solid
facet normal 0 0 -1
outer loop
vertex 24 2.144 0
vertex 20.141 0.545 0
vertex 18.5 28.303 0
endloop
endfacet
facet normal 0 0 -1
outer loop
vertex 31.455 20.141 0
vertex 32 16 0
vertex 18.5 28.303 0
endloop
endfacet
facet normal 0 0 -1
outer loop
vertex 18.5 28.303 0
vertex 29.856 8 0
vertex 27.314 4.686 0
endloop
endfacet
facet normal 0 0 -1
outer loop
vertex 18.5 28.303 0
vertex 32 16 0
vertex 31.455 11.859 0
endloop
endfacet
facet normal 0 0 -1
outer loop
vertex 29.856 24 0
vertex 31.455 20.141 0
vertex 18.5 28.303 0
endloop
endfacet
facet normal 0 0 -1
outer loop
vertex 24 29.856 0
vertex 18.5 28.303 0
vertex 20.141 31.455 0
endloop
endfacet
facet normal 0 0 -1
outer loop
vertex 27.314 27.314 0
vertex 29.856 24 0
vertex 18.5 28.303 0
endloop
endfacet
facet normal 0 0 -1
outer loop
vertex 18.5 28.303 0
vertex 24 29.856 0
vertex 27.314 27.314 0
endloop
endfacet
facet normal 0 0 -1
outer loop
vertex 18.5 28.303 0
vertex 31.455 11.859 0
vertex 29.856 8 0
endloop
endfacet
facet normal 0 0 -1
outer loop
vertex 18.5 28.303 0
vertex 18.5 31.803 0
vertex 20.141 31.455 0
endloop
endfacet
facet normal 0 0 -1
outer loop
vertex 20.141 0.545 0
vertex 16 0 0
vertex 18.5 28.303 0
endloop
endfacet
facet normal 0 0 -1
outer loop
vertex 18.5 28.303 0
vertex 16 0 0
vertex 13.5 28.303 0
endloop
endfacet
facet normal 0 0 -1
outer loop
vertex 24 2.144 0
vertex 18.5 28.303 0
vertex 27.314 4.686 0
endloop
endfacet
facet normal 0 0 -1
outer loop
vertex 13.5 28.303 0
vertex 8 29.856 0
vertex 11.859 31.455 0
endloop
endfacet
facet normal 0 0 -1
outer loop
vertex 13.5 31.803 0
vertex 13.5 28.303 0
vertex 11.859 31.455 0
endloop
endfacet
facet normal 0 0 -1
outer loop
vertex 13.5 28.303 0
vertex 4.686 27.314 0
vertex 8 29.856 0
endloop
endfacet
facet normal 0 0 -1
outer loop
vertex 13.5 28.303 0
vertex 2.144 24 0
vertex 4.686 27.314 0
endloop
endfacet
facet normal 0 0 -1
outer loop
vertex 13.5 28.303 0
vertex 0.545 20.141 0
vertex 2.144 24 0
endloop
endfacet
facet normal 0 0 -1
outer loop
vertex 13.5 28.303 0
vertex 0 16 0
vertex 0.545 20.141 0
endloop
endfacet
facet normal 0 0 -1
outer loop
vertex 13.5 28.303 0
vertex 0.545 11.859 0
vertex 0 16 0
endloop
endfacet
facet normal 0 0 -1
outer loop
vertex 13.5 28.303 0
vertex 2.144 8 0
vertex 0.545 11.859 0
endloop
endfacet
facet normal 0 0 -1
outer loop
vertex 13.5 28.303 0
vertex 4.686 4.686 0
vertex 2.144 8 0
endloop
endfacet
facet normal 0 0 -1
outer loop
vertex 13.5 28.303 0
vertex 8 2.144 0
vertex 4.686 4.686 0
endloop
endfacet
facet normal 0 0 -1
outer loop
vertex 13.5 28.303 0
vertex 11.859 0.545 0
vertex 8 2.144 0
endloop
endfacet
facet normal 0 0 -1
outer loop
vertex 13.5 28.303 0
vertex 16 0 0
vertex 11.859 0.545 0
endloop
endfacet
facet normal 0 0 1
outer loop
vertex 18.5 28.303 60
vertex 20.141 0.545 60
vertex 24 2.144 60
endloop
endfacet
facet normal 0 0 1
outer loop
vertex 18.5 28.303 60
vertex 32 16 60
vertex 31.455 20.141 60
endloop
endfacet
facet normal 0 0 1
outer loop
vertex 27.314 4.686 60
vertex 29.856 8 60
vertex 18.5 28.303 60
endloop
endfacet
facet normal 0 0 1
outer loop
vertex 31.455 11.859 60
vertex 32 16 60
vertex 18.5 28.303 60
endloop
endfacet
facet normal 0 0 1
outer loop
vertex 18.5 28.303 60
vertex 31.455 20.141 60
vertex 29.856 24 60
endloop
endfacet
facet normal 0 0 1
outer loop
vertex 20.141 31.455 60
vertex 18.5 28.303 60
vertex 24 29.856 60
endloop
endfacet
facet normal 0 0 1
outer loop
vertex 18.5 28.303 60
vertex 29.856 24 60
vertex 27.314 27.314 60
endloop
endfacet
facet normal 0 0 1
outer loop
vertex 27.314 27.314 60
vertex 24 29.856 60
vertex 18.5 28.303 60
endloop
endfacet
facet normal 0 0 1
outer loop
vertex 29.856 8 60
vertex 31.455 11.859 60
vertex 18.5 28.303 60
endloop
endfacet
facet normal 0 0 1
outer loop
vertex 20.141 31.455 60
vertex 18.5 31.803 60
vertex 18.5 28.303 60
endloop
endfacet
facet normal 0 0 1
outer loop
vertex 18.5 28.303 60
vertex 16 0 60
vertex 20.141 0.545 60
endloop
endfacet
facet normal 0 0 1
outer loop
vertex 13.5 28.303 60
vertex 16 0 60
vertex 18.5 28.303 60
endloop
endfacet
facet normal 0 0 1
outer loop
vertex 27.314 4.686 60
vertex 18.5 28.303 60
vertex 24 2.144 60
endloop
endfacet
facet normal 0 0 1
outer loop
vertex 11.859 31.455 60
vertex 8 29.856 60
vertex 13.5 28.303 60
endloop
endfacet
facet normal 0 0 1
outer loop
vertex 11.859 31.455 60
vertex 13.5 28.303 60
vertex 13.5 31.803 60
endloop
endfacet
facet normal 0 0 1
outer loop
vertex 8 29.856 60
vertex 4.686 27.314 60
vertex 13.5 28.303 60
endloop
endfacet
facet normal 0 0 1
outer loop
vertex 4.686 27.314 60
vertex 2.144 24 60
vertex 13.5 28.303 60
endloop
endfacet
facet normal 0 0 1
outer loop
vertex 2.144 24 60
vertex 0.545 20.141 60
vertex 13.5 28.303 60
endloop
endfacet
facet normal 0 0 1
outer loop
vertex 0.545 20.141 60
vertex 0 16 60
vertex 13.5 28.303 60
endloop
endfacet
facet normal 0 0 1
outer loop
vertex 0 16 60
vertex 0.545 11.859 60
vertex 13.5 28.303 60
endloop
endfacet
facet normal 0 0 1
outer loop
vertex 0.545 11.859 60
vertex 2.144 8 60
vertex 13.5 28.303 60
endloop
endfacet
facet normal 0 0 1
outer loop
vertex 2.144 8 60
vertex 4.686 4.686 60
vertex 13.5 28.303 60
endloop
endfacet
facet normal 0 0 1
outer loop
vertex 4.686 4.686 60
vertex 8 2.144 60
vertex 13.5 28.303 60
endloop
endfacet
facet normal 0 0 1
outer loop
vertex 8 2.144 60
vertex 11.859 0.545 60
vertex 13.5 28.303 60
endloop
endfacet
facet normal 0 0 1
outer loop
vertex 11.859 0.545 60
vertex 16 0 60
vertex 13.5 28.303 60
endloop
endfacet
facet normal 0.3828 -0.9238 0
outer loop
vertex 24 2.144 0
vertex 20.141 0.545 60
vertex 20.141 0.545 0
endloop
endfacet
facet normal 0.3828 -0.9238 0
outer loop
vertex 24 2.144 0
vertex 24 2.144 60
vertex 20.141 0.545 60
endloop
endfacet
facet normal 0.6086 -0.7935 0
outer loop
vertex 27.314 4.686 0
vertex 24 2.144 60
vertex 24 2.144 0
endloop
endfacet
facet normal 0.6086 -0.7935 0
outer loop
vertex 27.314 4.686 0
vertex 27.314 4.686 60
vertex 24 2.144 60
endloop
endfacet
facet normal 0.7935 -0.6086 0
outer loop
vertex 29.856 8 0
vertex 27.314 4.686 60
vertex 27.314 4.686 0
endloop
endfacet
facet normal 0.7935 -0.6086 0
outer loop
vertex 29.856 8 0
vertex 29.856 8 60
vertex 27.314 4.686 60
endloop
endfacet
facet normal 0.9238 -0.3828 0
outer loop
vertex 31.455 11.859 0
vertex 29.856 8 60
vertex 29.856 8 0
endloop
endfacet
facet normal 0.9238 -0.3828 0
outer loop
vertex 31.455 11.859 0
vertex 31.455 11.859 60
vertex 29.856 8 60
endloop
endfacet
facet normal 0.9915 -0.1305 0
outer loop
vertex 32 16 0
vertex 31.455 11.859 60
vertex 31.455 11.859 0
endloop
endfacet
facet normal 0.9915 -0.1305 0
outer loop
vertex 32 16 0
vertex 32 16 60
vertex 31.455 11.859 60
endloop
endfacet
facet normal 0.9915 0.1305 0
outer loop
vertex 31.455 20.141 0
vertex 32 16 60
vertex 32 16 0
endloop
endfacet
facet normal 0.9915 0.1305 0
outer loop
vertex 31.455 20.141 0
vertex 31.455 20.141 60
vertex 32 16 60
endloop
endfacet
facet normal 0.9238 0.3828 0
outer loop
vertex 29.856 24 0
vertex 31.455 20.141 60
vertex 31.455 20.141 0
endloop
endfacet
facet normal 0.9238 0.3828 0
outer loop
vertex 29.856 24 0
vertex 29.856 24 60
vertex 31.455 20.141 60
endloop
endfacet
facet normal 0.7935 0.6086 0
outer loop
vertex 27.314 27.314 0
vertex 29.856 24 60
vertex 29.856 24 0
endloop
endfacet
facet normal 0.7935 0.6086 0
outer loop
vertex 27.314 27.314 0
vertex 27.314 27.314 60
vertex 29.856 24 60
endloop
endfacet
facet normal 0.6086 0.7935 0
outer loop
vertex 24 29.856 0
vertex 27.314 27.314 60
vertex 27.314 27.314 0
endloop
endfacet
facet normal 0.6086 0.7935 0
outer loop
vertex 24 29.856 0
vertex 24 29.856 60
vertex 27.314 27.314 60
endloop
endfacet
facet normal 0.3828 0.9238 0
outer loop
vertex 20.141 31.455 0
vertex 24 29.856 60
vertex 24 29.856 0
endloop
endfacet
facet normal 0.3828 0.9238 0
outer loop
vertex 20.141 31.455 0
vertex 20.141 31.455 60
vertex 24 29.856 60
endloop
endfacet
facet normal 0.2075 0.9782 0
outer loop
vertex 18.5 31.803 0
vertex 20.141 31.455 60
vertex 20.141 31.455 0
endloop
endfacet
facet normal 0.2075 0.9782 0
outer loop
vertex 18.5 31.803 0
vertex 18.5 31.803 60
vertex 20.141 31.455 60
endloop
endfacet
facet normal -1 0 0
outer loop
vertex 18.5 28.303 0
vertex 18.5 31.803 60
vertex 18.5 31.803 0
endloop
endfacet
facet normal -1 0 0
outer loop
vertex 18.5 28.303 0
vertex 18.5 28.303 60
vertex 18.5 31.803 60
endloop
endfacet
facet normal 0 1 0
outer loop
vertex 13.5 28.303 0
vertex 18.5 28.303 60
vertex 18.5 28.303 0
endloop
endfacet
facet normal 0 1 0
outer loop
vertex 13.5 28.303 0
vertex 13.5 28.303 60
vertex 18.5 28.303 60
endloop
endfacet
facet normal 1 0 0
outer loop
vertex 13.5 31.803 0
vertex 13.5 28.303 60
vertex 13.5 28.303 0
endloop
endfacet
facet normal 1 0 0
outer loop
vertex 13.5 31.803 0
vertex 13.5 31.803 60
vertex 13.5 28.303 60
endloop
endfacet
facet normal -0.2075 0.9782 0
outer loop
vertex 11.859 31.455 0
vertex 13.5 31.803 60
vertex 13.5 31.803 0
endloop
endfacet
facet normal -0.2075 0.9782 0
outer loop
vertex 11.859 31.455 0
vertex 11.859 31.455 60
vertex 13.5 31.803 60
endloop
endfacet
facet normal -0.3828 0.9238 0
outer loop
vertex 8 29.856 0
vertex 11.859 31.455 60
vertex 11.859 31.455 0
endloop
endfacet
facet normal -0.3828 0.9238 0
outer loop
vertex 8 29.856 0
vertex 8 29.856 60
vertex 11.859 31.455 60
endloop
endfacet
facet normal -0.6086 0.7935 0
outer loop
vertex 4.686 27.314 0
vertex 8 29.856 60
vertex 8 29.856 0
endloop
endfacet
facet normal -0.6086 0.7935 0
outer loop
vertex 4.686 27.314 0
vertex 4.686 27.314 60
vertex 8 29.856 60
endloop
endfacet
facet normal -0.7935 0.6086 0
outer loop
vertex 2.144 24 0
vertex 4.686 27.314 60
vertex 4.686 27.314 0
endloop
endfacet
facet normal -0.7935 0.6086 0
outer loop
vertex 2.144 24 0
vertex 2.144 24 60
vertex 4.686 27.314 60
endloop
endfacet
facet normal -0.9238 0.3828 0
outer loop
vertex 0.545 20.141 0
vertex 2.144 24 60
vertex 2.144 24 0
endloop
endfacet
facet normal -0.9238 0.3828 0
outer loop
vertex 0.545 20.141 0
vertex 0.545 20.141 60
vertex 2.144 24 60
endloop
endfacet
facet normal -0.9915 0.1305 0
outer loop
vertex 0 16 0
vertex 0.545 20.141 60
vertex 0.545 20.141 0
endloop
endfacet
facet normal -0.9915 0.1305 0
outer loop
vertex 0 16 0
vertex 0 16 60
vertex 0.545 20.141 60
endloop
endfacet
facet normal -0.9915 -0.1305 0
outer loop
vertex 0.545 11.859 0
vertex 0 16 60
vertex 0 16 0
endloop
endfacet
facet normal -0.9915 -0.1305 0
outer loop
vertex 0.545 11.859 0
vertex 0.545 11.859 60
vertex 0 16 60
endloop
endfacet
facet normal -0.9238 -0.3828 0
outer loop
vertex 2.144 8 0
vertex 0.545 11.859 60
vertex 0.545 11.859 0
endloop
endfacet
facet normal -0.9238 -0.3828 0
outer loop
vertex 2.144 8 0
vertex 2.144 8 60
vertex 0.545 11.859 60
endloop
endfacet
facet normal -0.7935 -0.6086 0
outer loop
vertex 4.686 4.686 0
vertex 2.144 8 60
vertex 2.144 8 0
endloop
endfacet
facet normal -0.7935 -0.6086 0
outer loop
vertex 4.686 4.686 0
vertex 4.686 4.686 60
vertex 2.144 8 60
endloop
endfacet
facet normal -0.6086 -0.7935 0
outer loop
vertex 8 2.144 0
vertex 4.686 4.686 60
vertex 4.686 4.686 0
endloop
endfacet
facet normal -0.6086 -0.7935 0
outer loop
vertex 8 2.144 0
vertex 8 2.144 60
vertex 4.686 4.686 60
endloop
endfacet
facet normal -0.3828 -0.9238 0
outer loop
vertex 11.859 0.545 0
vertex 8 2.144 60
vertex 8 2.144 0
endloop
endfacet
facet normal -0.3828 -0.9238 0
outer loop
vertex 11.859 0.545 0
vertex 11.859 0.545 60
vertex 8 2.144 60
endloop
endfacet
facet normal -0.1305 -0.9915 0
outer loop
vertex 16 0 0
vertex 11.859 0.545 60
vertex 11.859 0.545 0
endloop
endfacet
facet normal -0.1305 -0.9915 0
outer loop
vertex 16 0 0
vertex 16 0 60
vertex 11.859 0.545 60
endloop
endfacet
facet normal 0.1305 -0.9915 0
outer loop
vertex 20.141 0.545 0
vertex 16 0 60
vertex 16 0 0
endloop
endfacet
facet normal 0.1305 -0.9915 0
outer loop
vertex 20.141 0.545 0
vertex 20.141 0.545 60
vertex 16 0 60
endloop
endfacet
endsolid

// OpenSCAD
$fn = 32;

// ----------------------------------------------------------------------
// Keyway shaft: d32 shaft, key 5 x 3.5 mm
// ----------------------------------------------------------------------

// --- parameters (mm) ---
shaft_r = 16;             // shaft radius
key_w = 5;                // keyway width
key_d = 3.5;              // keyway depth below the surface line
plate_t = 60;             // shaft length, Z (extrusion height)

shaft_d = 2 * shaft_r;  // shaft diameter
circle_step = 15;  // polygon sampling step, degrees

profile = [[11.859, 31.455], [8, 29.856], [4.686, 27.314], [2.144, 24], [0.545, 20.141], [0, 16], [0.545, 11.859], [2.144, 8], [4.686, 4.686], [8, 2.144], [11.859, 0.545], [16, 0], [20.141, 0.545], [24, 2.144], [27.314, 4.686], [29.856, 8], [31.455, 11.859], [32, 16], [31.455, 20.141], [29.856, 24], [27.314, 27.314], [24, 29.856], [20.141, 31.455], [18.5, 31.803], [18.5, 28.303], [13.5, 28.303], [13.5, 31.803]];  // primary outline, 27 points, counter clockwise

// --- the one profile operation ---
linear_extrude(height = plate_t) polygon(points = profile);
